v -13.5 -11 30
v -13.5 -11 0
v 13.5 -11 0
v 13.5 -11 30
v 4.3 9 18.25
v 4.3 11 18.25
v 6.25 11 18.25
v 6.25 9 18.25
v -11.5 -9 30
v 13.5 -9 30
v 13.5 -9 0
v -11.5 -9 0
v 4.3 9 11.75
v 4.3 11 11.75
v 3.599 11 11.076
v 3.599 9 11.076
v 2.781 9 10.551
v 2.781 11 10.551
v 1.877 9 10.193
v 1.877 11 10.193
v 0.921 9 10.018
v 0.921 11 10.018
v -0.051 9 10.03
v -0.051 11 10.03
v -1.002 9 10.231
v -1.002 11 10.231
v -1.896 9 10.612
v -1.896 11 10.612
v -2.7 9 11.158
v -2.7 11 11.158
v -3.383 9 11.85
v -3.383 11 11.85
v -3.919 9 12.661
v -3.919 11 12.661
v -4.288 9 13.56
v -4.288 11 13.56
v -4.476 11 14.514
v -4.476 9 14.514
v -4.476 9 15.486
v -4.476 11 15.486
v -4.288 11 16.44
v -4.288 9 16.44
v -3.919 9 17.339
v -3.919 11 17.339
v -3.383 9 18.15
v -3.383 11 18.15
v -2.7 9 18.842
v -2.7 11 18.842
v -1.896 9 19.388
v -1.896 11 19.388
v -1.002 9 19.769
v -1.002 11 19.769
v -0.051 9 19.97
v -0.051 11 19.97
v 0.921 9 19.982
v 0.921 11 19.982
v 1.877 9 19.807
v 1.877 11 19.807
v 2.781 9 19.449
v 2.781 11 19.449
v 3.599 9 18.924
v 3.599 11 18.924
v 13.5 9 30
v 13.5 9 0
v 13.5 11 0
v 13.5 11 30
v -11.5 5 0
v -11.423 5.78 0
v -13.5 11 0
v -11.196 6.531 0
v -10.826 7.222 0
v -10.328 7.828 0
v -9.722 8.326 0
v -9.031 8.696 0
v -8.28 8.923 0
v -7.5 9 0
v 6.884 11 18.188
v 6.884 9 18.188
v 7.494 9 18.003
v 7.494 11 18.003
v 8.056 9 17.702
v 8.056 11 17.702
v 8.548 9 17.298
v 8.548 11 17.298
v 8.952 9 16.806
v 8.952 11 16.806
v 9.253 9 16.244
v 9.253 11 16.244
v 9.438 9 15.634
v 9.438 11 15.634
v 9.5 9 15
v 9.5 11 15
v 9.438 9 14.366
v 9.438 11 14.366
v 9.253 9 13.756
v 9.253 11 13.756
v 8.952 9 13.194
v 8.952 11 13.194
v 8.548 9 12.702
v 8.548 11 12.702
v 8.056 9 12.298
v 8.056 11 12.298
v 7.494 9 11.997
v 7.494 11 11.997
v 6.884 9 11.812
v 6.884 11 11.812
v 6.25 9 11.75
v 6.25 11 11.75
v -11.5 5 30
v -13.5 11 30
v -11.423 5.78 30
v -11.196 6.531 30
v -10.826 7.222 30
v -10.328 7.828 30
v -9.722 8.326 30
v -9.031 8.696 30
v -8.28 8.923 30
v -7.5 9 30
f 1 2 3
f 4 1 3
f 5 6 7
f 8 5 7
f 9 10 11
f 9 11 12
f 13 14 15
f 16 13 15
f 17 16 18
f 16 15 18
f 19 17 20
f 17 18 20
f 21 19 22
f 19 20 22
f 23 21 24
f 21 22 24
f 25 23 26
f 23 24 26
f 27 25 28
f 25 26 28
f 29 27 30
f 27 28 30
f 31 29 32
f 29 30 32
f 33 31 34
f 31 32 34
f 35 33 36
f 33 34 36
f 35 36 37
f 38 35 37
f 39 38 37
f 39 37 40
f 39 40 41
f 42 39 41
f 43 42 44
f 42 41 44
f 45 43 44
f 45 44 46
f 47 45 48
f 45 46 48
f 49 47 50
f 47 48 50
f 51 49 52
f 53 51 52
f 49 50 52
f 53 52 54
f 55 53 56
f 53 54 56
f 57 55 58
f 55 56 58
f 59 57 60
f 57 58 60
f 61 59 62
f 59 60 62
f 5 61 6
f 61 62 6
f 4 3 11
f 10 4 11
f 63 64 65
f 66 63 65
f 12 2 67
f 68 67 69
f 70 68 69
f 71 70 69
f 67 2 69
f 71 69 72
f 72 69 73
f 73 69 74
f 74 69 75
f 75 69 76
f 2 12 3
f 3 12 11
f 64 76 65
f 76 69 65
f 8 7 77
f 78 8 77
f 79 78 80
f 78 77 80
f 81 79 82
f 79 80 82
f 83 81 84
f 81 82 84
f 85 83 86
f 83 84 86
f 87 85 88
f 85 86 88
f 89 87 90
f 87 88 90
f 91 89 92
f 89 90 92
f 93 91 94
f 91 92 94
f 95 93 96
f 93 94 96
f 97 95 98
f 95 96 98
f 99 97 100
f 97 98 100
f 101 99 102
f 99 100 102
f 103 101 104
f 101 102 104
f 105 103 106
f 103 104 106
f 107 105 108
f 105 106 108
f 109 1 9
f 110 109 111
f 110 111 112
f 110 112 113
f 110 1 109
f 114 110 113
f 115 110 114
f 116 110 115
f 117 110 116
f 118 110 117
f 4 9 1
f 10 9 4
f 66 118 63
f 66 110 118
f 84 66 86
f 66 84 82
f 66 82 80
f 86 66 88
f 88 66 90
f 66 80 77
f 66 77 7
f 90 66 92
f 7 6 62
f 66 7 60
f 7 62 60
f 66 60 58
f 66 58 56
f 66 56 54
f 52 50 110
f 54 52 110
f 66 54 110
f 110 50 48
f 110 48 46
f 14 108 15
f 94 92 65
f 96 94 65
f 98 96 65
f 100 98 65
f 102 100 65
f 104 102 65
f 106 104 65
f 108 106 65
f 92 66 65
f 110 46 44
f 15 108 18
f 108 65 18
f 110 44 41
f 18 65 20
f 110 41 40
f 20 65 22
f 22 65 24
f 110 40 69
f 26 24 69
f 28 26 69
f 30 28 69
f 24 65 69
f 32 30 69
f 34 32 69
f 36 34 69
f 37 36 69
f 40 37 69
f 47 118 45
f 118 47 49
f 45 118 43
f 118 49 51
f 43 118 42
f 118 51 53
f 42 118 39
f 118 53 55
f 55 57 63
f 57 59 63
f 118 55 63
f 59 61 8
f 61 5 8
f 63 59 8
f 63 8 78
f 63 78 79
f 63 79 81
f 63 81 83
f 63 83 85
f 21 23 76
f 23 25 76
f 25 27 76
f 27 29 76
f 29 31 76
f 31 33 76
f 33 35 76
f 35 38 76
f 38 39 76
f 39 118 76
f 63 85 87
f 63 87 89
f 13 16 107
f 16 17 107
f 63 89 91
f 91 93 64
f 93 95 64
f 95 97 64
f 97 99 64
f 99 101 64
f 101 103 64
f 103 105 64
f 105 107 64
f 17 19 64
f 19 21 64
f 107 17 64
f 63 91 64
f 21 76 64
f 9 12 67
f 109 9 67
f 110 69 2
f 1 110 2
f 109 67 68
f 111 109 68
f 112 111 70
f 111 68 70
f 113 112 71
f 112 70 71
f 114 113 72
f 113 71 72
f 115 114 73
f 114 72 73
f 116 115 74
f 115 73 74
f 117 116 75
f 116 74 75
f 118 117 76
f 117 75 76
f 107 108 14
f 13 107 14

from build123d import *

# Parameters (mm, degrees)
F1_DEPTH = 30
F3_DEPTH = 2


with BuildPart() as f1:
    # F0 (on Top) → F1 (new body)
    with BuildSketch(Plane.XY):
        with BuildLine():
            Line((-13.5, -11), (13.5, -11))
            Line((13.5, -11), (13.5, -9))
            Line((13.5, -9), (-11.5, -9))
            Line((-11.5, -9), (-11.5, 5))
            ThreePointArc((-11.5, 5), (-10.328427, 7.828427), (-7.5, 9))
            Line((-7.5, 9), (13.5, 9))
            Line((13.5, 9), (13.5, 11))
            Line((13.5, 11), (-13.5, 11))
            Line((-13.5, 11), (-13.5, -11))
        make_face()
    extrude(amount=F1_DEPTH)

    # F2 (on face) → F3 (cut, through all)
    with BuildSketch(Plane(origin=(0, 11, 0), x_dir=(-1, 0, 0), z_dir=(0, 1, 0))):
        with BuildLine():
            Line((-6.25, 11.75), (-4.299671, 11.75))
            Line((-4.299671, 11.75), (-0.5, 11.75))
            Line((-0.5, 11.75), (-0.5, 18.25))
            Line((-0.5, 18.25), (-4.299671, 18.25))
            Line((-4.299671, 18.25), (-6.25, 18.25))
            ThreePointArc((-6.25, 18.25), (-9.5, 15), (-6.25, 11.75))
        make_face()
        with BuildLine():
            Line((-0.5, 11.75), (-4.299671, 11.75))
            ThreePointArc((-4.299671, 11.75), (4.5, 15), (-4.299671, 18.25))
            Line((-4.299671, 18.25), (-0.5, 18.25))
            Line((-0.5, 18.25), (-0.5, 11.75))
        make_face()
    extrude(amount=-F3_DEPTH, mode=Mode.SUBTRACT)


solid = f1.part
